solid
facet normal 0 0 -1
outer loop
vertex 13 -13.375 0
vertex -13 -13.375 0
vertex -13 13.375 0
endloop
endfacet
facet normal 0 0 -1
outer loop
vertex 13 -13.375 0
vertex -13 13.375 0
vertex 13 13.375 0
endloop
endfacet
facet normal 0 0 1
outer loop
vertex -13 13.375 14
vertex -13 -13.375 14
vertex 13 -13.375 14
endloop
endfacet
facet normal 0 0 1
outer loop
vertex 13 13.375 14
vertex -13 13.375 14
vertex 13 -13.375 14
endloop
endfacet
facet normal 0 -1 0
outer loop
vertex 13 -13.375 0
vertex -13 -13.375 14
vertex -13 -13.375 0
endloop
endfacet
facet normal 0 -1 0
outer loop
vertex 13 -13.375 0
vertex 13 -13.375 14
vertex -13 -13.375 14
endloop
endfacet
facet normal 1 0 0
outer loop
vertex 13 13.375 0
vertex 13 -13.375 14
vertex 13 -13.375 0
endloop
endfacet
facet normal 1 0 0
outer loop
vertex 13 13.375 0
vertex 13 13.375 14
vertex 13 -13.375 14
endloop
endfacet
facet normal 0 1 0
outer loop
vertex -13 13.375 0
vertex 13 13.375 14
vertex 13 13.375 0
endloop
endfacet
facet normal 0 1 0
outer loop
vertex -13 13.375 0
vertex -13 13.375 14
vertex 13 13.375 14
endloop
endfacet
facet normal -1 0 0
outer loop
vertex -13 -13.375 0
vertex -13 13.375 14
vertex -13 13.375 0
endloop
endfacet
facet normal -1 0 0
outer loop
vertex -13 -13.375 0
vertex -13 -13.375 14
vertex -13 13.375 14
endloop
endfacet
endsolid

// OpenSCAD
// Datheet: http://www.farnell.com/datasheets/1870439.pdf
CHASSIS_X_LENGTH = 26;
CHASSIS_Y_LENGTH = 26.75;
CHASSIS_Z_LENGTH = 14;

// Increase steps in render to have quality circles
$fs=0.01;


module Transformer() {
    
    linear_extrude(height = CHASSIS_Z_LENGTH, convexity = 10, twist = 0)
translate([-CHASSIS_X_LENGTH/2, -CHASSIS_Y_LENGTH/2,0])
        square([CHASSIS_X_LENGTH,CHASSIS_Y_LENGTH]);
}

Transformer();
